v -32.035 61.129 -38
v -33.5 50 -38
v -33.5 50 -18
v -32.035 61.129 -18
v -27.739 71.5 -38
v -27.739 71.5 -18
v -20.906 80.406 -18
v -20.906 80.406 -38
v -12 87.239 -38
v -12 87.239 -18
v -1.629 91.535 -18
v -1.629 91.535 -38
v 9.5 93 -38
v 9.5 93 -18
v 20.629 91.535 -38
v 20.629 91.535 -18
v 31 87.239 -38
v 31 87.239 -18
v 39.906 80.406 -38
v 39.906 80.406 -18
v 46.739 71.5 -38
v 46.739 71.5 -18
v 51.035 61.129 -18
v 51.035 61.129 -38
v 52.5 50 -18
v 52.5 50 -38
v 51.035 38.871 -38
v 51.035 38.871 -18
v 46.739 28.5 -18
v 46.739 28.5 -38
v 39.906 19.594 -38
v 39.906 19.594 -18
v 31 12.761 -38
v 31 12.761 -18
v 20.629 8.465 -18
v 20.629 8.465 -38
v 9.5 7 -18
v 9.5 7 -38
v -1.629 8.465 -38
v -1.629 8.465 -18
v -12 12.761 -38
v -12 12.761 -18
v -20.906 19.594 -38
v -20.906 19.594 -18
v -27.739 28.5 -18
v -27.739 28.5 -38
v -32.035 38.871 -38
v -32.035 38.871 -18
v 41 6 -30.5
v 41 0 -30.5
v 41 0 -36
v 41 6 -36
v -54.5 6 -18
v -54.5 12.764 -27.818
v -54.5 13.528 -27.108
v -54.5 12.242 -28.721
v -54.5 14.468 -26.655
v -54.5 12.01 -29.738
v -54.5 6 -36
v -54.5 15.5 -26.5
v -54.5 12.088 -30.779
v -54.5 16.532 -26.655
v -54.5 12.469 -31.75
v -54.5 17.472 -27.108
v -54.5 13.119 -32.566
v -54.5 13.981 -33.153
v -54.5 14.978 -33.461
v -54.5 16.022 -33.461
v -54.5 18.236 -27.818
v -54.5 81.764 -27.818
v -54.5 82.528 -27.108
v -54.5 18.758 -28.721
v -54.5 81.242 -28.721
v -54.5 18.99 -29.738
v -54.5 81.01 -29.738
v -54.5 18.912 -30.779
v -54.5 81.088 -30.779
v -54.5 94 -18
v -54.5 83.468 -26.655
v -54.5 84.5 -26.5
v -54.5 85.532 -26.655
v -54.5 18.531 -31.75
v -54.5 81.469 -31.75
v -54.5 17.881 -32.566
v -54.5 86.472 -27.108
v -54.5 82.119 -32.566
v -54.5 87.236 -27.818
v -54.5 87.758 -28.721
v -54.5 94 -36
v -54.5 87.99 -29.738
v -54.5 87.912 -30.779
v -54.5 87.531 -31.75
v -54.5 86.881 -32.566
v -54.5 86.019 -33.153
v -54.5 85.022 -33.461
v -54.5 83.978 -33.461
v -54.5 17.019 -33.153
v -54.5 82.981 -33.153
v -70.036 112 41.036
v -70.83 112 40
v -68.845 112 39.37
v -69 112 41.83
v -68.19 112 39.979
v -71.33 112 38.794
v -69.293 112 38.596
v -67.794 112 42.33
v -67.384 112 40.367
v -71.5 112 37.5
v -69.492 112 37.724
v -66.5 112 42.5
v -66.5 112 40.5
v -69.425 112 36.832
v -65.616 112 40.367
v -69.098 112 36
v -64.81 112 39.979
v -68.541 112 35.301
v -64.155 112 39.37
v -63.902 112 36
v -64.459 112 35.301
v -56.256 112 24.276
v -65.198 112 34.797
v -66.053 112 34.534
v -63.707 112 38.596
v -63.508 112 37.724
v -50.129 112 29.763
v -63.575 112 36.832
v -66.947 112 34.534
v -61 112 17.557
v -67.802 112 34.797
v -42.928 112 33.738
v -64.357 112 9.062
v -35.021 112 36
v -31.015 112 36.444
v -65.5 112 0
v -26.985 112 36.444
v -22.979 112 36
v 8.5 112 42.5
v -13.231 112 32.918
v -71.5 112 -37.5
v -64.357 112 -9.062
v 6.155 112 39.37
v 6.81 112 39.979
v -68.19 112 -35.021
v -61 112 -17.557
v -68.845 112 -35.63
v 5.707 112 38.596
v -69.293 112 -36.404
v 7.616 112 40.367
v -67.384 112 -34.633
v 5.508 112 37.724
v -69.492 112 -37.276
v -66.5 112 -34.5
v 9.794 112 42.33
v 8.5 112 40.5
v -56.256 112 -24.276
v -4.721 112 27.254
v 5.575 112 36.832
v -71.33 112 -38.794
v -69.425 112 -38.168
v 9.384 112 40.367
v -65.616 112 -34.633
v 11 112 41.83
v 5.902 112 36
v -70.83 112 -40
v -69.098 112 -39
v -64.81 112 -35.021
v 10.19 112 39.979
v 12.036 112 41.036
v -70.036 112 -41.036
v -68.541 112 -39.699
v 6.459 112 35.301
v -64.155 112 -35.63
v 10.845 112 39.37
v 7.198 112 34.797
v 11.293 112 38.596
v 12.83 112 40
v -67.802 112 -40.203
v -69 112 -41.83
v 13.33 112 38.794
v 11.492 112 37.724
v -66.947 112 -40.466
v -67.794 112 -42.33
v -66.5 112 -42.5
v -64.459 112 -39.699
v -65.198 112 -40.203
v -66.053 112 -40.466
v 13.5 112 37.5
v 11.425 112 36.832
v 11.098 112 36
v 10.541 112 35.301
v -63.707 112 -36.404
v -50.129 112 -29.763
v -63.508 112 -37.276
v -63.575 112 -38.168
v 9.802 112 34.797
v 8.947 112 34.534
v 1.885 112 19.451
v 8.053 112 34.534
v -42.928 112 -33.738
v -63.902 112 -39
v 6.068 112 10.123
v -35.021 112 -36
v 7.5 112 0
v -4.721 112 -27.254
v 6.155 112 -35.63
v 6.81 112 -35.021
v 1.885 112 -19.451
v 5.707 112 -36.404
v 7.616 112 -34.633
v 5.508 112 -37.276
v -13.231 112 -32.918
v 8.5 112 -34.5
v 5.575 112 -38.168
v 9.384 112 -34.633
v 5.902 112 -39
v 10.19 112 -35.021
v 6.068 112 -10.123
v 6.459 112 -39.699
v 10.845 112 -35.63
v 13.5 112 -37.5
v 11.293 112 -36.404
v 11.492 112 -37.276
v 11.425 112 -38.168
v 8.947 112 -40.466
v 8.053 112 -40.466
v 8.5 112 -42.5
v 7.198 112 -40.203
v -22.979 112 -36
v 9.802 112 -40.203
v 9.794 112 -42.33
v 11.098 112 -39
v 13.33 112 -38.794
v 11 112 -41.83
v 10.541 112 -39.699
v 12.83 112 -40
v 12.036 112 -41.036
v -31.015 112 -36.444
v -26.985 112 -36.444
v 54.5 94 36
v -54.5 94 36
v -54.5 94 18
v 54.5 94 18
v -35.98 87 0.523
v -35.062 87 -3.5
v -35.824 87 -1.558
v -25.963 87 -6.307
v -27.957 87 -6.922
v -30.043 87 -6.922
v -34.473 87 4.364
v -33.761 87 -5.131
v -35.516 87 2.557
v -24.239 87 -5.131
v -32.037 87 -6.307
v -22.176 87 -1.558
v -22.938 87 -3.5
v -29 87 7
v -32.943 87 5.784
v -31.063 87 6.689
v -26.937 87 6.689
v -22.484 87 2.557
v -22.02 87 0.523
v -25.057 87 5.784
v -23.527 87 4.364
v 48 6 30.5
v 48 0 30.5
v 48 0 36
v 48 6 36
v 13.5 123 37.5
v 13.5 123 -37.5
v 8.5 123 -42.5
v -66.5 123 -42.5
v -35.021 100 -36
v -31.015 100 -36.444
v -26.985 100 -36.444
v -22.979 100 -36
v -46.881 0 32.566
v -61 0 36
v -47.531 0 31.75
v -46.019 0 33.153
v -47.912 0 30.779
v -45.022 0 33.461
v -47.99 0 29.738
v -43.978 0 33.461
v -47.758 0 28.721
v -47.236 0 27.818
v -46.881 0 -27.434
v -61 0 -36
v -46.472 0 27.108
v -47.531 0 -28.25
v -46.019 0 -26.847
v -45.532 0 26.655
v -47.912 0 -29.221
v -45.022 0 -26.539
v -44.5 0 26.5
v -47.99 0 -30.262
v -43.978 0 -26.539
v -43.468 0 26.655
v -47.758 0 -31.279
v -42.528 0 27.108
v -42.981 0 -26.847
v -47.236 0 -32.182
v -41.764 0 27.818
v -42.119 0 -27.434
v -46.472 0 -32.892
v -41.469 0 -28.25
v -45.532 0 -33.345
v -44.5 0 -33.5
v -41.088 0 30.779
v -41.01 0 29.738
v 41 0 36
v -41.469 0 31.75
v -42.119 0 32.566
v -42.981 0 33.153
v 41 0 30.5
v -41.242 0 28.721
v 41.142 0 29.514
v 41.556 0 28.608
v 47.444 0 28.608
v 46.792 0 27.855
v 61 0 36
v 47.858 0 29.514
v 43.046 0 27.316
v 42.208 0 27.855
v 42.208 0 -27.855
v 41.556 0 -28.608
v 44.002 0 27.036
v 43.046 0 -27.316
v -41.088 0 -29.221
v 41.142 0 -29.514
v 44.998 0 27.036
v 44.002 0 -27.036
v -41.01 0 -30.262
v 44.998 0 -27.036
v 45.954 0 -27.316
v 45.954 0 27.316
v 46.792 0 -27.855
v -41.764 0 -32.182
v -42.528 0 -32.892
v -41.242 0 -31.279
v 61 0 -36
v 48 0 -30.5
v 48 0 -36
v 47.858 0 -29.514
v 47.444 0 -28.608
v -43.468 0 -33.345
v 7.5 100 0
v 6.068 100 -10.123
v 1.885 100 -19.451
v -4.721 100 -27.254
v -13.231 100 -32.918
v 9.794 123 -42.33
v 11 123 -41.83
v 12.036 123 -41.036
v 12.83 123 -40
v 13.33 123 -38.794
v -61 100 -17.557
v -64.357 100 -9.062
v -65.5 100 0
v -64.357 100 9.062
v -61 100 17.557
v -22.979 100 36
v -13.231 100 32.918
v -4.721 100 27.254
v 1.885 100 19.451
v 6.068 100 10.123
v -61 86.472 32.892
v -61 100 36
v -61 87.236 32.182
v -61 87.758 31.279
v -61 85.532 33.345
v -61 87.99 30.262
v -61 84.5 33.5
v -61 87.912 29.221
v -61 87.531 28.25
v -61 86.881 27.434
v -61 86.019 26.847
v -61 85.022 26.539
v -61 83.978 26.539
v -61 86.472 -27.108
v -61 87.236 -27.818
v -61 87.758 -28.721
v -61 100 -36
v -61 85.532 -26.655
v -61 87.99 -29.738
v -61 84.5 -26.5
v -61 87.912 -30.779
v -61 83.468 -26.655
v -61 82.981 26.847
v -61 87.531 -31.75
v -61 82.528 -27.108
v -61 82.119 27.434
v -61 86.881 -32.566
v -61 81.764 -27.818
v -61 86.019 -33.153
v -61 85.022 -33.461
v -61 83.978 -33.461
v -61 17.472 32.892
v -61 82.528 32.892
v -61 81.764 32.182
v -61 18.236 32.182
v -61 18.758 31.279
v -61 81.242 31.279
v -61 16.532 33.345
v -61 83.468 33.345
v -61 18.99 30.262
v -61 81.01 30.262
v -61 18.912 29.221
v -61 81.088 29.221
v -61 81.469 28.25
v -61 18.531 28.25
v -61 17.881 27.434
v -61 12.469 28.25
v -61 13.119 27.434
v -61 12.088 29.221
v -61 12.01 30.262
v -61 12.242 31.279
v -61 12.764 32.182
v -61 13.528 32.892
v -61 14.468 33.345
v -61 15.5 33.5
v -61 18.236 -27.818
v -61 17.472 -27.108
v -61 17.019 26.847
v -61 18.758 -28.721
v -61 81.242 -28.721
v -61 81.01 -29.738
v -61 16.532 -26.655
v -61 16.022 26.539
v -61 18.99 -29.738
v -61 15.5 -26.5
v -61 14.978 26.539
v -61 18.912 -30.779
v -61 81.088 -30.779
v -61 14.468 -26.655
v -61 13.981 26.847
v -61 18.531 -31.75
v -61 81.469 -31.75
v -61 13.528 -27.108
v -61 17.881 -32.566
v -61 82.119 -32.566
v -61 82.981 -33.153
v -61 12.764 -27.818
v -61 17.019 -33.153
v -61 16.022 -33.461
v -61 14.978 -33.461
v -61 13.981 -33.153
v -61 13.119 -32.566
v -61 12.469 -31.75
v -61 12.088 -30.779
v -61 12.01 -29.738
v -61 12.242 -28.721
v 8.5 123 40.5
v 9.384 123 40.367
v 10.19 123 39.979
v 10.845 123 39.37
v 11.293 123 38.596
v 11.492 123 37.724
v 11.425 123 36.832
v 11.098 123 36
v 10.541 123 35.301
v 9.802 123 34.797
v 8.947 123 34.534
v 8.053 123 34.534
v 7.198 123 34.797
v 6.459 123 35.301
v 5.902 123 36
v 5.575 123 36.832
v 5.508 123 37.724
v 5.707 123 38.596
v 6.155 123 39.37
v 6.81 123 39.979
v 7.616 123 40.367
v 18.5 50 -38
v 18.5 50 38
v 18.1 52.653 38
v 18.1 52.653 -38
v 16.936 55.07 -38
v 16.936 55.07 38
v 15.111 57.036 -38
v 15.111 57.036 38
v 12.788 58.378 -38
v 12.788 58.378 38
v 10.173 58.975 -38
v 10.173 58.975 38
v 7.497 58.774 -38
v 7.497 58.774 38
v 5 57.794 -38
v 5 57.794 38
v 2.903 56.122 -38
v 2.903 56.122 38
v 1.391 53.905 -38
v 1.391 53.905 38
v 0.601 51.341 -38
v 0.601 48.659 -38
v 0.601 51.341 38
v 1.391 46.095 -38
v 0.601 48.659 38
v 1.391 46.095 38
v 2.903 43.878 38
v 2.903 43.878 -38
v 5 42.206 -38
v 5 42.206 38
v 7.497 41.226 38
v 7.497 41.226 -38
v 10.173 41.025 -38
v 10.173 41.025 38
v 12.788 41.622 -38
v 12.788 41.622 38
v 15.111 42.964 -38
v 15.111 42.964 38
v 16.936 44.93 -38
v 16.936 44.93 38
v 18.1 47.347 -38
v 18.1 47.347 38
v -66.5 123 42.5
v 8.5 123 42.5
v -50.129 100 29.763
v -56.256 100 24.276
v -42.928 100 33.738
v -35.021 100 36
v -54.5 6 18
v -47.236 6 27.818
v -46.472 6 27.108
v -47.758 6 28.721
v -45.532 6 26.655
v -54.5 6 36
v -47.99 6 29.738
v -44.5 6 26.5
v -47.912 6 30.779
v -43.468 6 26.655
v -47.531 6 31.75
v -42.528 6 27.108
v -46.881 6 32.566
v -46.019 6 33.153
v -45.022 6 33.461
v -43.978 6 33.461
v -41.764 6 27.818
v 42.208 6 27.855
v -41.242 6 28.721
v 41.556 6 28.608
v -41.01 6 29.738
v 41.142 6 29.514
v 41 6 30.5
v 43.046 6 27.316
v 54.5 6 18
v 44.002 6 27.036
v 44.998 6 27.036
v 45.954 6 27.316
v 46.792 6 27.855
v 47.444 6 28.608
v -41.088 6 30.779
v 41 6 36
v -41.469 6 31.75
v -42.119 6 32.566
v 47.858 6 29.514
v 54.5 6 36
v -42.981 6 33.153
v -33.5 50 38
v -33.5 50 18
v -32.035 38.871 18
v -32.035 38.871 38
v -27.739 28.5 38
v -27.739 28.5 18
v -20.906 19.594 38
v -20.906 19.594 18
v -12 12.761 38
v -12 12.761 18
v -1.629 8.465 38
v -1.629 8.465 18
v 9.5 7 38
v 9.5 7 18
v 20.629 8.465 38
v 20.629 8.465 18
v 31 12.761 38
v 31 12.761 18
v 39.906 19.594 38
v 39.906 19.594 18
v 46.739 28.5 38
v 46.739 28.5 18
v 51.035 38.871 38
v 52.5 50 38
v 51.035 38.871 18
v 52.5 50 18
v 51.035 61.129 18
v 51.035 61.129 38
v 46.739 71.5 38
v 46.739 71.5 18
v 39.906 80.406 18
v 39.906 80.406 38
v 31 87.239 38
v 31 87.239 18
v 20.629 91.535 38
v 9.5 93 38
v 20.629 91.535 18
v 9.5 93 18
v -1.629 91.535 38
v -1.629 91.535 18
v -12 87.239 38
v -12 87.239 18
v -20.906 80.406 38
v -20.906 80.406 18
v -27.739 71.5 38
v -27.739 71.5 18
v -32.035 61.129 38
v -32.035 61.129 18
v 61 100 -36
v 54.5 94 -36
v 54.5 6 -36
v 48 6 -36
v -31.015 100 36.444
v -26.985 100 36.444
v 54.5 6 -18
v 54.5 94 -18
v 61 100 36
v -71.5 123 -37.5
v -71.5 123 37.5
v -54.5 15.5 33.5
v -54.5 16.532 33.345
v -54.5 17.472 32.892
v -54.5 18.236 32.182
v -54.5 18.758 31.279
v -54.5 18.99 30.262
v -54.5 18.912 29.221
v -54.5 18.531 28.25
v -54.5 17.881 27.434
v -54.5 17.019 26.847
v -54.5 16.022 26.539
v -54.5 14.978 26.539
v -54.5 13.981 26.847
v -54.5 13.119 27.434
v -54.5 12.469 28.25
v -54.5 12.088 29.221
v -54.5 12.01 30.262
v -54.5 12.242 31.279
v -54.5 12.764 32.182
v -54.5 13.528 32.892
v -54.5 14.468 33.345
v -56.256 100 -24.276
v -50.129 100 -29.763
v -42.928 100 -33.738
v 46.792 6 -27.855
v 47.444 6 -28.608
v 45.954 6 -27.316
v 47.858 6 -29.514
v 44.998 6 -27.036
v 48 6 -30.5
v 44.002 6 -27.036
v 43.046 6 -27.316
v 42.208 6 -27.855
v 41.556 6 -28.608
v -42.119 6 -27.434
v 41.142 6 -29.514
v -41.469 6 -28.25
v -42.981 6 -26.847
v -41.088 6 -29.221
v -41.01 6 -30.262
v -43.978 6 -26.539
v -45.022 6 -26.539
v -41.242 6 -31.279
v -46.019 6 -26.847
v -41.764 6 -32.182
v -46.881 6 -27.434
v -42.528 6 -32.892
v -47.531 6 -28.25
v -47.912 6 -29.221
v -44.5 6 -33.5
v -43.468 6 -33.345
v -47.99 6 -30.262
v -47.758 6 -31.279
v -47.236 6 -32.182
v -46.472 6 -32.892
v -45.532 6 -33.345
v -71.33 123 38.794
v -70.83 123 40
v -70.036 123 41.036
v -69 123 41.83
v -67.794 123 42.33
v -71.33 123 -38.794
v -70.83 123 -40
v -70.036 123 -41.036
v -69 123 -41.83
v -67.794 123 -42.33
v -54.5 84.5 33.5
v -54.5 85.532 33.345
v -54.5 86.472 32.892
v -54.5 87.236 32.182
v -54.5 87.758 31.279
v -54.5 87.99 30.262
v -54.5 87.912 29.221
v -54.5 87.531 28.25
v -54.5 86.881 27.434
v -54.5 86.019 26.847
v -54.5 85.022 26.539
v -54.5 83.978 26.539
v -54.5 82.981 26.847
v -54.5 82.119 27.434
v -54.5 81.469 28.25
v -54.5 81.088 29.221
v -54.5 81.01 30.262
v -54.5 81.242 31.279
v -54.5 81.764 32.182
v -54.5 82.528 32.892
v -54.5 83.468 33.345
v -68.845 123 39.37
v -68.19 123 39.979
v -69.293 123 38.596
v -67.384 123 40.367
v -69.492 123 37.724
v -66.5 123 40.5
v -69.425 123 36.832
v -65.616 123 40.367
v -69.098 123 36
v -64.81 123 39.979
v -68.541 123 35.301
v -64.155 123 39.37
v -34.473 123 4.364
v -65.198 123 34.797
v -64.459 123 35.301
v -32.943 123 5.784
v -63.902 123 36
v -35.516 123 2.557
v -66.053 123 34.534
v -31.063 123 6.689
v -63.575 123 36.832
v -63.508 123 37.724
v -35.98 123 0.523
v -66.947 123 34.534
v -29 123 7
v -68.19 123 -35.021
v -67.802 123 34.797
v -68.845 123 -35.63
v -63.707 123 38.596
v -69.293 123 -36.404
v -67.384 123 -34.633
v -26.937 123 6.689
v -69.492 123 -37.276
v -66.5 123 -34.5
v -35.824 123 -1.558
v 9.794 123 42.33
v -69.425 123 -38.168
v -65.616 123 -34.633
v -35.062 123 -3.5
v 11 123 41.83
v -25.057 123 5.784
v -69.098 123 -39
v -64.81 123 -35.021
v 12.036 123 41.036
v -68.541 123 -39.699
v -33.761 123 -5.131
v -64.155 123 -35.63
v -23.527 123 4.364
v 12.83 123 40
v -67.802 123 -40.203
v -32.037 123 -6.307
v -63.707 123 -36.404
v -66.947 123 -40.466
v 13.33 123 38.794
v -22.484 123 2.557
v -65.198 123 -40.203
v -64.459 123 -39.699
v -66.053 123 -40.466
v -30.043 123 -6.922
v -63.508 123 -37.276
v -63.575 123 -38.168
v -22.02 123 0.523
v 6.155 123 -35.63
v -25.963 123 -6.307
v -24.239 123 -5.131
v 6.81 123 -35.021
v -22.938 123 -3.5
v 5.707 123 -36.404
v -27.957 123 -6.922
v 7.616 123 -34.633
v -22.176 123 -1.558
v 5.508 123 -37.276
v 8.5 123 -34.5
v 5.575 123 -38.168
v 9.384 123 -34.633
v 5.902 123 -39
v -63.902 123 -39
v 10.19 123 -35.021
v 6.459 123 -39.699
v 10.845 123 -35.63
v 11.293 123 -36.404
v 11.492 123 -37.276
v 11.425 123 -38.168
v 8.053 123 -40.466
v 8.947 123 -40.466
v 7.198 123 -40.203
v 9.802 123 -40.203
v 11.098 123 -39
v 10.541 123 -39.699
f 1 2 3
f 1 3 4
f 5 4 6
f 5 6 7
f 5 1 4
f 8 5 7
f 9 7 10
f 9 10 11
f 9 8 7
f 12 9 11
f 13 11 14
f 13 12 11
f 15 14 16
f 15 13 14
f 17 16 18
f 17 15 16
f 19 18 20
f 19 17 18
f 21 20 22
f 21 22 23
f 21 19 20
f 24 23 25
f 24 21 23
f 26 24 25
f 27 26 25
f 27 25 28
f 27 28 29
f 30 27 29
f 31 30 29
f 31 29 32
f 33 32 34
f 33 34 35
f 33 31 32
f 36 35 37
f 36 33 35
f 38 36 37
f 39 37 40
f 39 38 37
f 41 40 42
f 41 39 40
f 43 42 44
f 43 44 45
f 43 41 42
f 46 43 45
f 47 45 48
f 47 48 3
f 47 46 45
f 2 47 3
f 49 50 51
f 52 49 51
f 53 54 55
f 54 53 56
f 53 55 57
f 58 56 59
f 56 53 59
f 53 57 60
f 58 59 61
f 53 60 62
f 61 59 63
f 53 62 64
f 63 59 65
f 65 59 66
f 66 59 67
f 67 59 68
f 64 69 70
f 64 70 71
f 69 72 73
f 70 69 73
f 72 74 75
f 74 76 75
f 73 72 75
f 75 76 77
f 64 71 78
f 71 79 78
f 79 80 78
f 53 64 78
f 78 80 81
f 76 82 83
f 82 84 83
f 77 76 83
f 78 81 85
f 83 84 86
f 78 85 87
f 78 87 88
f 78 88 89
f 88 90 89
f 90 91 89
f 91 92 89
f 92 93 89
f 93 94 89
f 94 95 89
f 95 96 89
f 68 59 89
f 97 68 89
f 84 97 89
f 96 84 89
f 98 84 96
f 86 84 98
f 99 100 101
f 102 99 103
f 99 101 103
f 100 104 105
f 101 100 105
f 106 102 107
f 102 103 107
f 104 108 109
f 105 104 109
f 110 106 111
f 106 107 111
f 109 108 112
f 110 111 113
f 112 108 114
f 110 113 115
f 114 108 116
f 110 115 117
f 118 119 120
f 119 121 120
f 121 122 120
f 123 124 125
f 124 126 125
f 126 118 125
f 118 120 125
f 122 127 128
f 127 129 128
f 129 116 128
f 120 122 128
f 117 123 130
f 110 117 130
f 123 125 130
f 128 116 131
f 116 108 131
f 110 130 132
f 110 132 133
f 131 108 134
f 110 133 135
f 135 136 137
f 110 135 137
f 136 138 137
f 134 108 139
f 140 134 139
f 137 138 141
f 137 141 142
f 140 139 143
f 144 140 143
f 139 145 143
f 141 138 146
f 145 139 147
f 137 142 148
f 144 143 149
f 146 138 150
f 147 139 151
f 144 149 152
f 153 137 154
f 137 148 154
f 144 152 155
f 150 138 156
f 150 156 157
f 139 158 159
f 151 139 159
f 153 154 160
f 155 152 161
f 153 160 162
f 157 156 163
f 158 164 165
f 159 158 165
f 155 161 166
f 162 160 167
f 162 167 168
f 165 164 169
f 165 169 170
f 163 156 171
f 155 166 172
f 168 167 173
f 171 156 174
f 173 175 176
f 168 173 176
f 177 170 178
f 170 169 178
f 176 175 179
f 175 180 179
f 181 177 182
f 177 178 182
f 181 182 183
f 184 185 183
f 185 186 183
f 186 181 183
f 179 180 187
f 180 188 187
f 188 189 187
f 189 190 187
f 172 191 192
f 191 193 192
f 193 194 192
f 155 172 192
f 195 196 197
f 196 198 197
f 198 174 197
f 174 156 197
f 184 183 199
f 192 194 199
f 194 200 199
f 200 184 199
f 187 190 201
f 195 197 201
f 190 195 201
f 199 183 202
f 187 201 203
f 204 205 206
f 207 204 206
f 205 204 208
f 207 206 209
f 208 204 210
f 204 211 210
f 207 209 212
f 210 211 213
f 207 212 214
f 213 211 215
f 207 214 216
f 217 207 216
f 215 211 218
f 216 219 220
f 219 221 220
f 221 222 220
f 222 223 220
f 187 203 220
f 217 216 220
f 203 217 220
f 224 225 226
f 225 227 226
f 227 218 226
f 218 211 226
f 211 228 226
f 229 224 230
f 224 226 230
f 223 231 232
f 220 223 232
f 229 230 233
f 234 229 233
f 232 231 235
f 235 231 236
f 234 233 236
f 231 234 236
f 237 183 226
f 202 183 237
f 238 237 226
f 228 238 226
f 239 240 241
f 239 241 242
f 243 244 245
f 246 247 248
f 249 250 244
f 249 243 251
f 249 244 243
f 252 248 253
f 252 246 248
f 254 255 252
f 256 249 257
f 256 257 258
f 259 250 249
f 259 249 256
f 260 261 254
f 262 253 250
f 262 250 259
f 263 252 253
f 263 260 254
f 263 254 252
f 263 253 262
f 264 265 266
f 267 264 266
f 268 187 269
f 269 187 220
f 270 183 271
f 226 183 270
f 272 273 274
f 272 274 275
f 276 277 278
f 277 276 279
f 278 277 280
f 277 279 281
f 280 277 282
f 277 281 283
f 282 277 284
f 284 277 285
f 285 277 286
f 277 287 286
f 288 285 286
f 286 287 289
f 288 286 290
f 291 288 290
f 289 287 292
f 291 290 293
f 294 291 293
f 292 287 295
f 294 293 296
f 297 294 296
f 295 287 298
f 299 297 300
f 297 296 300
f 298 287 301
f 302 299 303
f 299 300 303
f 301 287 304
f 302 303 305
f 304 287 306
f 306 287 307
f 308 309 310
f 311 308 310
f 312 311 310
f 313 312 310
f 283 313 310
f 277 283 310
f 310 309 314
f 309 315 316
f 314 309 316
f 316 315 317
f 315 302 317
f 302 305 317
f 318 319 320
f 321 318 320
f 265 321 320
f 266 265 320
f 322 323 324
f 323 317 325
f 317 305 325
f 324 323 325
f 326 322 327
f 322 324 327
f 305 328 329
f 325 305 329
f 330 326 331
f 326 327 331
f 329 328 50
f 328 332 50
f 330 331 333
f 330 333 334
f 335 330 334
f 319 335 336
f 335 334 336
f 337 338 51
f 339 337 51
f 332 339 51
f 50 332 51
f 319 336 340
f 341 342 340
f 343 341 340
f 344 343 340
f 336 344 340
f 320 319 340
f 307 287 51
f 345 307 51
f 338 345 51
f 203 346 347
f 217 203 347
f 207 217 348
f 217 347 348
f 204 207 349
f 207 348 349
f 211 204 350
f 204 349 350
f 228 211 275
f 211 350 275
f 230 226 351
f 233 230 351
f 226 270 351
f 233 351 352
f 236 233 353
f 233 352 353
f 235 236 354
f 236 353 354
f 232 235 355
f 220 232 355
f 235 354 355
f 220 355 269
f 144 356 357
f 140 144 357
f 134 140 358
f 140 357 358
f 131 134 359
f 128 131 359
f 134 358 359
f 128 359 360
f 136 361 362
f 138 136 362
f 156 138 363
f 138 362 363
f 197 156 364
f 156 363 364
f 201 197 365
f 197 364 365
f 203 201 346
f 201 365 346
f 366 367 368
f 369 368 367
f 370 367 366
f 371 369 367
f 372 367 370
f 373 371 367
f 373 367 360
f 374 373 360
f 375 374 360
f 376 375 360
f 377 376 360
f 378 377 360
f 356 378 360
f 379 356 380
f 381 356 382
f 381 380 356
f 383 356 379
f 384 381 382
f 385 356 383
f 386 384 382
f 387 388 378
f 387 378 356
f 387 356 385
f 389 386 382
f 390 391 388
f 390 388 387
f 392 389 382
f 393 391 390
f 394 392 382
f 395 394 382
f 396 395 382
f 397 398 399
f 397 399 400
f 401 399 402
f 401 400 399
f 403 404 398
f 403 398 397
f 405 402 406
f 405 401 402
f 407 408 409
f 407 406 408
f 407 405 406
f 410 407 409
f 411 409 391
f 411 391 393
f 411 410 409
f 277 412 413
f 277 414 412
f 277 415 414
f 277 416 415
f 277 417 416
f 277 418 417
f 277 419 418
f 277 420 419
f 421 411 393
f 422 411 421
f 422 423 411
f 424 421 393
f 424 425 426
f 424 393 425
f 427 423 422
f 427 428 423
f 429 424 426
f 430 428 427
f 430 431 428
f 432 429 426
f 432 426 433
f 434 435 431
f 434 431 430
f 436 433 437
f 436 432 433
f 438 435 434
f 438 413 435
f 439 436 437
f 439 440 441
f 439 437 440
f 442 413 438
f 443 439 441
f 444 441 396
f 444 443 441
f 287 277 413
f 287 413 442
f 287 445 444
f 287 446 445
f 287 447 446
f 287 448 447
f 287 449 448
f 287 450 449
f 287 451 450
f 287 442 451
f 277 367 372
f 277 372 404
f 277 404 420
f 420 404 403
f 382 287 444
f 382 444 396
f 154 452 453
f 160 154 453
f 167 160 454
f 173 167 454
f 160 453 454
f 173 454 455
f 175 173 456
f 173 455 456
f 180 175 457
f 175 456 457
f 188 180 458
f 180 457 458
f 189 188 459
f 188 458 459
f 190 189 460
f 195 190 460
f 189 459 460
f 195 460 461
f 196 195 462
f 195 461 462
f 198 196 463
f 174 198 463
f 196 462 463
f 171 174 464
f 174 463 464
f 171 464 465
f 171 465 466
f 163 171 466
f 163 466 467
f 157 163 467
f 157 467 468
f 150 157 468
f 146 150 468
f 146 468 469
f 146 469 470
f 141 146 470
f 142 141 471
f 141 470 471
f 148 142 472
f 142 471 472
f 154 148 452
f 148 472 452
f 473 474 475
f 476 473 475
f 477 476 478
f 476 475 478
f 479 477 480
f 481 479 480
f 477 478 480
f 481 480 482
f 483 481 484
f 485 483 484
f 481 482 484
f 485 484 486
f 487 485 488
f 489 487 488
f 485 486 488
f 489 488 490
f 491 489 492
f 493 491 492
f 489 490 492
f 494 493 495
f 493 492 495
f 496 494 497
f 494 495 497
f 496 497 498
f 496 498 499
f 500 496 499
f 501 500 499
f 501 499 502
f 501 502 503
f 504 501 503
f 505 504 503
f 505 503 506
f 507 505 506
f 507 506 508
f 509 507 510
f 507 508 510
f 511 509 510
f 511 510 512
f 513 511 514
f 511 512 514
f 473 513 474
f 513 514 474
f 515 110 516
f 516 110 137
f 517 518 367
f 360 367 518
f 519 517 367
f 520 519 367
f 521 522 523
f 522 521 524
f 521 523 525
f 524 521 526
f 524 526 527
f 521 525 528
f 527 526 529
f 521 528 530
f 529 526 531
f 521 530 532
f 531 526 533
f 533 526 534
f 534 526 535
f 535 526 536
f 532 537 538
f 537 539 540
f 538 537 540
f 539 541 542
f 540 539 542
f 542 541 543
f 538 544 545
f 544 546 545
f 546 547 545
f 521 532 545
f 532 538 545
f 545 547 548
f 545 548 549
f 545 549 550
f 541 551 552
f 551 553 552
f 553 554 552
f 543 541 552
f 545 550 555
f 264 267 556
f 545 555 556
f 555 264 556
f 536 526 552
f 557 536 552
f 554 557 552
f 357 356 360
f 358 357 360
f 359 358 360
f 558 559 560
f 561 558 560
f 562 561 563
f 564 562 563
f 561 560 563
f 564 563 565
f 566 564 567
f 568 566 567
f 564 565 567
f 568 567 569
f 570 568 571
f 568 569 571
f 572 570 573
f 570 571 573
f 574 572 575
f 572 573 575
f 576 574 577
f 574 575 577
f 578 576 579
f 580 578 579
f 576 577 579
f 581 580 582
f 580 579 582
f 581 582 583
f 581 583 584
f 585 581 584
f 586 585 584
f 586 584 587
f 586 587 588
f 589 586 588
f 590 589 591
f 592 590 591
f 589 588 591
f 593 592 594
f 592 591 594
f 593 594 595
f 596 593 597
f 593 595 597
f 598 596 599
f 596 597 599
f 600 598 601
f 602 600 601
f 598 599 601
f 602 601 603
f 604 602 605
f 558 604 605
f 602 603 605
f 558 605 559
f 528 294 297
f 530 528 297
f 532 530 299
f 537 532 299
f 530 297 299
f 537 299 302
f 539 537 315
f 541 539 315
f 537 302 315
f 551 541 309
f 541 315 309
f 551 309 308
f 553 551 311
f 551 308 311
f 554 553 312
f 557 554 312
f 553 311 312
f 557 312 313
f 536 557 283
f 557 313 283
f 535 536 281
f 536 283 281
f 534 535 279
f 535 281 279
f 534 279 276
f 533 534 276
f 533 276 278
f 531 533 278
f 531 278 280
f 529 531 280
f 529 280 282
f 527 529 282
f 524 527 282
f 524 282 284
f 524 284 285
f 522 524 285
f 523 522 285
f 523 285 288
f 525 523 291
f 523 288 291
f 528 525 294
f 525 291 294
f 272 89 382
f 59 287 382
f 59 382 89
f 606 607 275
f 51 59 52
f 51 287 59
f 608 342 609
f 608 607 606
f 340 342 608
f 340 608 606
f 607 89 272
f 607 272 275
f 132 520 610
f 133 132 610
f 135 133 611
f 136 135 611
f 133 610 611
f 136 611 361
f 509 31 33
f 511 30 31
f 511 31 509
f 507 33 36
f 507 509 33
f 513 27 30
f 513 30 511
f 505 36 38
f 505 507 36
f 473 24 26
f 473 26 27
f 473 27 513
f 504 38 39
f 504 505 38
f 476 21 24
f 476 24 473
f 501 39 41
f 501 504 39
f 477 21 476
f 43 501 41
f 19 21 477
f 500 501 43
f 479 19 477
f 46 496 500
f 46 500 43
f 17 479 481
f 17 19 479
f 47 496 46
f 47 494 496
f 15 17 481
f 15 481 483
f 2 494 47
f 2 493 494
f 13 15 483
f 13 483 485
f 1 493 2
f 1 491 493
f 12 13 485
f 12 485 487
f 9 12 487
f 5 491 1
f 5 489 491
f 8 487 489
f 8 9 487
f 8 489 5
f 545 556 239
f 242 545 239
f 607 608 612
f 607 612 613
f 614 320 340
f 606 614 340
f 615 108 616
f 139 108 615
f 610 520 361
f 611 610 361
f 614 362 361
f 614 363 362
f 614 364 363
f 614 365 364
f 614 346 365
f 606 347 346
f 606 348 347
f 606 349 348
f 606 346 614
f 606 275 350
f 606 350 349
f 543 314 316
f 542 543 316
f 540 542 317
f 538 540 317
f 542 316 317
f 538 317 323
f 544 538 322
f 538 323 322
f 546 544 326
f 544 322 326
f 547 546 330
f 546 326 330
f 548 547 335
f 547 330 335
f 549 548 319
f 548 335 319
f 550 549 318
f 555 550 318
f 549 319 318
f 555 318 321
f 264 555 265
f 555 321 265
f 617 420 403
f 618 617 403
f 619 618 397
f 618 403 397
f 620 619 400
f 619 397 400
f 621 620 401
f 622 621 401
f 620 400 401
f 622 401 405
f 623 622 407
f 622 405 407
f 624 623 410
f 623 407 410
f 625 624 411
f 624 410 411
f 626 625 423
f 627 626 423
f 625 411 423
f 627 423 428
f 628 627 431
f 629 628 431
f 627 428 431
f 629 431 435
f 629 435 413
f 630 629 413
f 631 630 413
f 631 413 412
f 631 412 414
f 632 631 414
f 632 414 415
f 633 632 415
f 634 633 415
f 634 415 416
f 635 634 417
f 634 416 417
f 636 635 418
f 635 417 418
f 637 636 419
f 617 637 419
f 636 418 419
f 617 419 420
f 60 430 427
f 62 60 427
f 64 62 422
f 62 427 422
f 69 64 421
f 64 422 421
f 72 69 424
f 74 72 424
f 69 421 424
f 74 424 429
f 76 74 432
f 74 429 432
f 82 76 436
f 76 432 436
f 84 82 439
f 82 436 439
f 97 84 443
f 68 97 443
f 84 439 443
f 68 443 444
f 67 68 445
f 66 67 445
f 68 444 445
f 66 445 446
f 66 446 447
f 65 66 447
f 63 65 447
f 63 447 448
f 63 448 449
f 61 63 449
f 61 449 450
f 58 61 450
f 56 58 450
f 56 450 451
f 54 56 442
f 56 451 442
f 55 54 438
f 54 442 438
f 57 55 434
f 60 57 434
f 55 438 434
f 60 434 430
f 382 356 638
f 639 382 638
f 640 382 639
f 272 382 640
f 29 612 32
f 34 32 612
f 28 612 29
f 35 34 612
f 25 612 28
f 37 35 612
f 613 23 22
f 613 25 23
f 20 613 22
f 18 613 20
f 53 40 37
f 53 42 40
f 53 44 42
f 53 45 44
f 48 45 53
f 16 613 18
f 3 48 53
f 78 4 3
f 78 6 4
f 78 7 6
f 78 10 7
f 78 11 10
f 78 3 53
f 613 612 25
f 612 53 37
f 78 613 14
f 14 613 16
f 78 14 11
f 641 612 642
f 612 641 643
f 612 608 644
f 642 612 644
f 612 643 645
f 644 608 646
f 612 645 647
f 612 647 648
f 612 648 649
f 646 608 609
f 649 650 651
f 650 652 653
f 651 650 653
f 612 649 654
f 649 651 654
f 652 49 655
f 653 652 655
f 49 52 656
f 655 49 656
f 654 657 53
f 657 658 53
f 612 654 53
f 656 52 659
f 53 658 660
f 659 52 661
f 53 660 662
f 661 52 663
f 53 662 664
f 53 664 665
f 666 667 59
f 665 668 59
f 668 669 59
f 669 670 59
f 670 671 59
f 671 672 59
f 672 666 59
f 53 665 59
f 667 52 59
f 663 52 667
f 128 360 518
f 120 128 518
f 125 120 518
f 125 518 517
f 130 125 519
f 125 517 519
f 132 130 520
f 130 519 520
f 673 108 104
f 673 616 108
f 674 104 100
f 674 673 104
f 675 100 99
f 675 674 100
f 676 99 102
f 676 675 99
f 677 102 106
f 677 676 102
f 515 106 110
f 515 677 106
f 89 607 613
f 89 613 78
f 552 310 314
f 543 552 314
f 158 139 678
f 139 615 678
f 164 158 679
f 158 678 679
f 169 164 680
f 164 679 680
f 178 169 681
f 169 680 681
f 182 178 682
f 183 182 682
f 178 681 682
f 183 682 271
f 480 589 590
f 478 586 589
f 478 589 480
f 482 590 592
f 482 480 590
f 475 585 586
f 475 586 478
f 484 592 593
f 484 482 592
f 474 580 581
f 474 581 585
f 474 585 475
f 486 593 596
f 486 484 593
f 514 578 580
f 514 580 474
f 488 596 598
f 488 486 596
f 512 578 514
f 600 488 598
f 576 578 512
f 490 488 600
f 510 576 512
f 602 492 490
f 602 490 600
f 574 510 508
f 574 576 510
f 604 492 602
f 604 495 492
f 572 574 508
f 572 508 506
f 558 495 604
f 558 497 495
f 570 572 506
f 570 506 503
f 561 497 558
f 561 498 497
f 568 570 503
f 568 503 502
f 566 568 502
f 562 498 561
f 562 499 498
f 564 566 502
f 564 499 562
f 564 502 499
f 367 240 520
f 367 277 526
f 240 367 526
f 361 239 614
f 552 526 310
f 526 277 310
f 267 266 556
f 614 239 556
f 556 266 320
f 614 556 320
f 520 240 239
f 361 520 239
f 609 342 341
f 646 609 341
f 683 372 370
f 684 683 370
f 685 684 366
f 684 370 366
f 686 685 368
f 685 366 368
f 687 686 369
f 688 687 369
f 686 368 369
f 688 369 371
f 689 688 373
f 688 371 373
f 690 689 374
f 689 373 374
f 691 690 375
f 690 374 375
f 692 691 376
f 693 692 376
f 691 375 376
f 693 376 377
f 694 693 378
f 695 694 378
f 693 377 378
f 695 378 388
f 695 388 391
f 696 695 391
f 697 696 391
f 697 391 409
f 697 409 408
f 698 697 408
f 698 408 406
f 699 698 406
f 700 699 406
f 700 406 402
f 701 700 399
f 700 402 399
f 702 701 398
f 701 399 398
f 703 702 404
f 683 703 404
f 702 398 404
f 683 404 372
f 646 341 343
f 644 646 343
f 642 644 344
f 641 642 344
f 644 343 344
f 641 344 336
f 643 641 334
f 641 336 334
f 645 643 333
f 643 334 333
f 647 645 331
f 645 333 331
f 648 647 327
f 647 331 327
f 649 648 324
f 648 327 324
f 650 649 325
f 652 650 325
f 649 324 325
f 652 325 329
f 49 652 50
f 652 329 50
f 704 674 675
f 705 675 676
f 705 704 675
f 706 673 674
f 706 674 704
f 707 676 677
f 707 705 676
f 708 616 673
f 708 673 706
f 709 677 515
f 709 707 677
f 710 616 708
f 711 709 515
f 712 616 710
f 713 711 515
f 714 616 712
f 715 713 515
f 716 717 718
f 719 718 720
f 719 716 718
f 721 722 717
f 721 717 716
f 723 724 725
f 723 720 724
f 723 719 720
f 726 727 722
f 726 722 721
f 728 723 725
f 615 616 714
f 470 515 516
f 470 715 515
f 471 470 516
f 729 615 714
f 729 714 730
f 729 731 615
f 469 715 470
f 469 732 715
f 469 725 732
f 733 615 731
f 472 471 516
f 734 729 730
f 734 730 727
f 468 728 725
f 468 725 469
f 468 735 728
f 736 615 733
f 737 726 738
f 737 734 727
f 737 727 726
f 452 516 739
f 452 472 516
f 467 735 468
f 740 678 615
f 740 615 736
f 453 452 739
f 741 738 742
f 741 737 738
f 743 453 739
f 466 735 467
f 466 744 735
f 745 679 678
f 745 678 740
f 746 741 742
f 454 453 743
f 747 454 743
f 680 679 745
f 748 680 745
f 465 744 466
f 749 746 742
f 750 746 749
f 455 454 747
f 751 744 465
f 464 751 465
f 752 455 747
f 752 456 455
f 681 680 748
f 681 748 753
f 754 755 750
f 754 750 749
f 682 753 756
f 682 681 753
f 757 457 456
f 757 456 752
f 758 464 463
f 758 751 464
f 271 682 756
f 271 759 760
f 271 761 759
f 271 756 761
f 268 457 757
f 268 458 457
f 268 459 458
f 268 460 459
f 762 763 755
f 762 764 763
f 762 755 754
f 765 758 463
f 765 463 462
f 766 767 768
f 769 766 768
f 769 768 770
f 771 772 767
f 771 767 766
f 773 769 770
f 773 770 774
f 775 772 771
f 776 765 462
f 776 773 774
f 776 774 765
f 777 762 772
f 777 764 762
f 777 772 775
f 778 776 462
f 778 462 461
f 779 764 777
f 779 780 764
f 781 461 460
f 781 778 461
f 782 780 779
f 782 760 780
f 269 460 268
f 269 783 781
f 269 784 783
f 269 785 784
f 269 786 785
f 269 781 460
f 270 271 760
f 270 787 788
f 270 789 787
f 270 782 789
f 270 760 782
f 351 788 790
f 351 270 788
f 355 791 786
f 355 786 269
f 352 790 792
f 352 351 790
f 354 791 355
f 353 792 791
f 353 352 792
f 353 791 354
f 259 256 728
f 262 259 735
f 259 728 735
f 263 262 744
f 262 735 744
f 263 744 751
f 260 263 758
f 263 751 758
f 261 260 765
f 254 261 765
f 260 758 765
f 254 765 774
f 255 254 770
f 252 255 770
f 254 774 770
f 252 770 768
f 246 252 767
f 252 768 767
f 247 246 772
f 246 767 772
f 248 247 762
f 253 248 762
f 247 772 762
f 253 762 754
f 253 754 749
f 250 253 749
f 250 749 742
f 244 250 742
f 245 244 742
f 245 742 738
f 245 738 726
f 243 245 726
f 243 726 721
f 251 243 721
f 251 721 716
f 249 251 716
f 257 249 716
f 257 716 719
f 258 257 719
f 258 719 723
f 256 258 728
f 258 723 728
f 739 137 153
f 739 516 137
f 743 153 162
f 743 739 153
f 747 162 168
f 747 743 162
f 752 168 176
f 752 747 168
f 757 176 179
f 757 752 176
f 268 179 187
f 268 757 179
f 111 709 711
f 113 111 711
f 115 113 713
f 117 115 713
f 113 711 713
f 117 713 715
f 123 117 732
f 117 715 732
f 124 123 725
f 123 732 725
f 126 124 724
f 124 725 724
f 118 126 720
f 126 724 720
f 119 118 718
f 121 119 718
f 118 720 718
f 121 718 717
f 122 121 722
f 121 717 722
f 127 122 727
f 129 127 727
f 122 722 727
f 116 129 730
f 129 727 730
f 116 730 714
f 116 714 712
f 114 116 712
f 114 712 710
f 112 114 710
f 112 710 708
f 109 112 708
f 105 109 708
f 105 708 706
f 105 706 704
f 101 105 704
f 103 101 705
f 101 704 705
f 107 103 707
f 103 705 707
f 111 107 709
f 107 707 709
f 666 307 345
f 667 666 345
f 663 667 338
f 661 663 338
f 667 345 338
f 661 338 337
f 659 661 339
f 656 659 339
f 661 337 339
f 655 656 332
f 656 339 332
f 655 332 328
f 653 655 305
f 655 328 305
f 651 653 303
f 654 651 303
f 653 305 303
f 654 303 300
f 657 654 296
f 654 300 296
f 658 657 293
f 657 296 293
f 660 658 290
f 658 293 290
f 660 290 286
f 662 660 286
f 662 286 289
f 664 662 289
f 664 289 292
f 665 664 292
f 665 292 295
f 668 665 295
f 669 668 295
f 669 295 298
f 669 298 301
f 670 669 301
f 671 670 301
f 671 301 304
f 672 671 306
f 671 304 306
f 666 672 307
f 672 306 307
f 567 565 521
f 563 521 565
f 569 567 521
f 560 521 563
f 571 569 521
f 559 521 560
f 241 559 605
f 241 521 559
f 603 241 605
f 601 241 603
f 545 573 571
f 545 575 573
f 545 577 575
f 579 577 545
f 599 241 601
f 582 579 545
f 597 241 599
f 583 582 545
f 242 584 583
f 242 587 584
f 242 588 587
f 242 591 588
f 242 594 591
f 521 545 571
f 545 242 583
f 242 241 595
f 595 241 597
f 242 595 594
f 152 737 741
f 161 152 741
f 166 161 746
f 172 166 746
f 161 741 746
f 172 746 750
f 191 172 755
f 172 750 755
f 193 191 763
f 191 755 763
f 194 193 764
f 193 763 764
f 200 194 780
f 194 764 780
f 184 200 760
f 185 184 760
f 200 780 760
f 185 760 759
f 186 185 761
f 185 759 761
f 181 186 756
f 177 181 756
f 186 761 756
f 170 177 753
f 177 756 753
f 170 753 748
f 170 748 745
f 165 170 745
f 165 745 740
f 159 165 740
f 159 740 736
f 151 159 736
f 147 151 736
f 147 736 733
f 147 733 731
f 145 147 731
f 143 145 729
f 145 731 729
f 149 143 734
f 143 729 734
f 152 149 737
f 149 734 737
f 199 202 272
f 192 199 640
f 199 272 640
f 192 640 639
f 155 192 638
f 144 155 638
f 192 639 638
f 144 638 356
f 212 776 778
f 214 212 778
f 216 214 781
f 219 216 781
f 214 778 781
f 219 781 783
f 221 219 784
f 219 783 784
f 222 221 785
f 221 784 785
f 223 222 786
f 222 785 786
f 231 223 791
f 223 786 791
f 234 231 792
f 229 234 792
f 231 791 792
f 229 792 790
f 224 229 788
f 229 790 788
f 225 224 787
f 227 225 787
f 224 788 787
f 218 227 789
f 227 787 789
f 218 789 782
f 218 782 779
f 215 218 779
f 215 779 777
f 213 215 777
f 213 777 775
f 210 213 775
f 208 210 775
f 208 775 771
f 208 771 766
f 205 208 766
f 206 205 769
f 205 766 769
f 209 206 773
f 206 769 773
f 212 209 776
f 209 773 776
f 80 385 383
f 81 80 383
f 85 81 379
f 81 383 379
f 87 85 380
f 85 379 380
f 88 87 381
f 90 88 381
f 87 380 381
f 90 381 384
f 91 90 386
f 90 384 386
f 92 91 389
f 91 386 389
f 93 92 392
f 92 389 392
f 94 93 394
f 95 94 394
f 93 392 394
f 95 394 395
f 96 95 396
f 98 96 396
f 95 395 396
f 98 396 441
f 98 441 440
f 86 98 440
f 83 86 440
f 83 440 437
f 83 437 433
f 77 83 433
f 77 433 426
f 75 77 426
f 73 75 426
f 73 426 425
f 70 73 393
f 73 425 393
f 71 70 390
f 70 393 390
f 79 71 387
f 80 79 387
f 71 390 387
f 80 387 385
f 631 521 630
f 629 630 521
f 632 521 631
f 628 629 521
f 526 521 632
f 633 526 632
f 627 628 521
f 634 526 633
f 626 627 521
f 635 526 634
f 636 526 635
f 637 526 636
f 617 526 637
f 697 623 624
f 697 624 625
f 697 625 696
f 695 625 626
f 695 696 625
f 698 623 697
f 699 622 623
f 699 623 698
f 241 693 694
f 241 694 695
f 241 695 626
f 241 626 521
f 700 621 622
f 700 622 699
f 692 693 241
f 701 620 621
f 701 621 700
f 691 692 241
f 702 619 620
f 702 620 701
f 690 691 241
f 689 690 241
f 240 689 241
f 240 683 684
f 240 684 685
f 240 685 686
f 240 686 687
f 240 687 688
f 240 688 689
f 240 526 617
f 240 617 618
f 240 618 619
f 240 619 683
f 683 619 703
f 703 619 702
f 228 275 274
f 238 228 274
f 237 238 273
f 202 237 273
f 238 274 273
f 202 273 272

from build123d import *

# Parameters (mm, degrees)
CROQUIS2_W              = 122
CROQUIS2_H              = 72
SALIENTE_EXTRUIR1_DEPTH = 100
CROQUIS3_W              = 109
CROQUIS3_H              = 88
CORTAR_EXTRUIR1_DEPTH   = 18
CROQUIS4_W              = 109
CROQUIS4_H              = 88
CORTAR_EXTRUIR2_DEPTH   = 18
SALIENTE_EXTRUIR2_DEPTH = 12
CROQUIS6_W              = 85
CROQUIS6_H              = 85
SALIENTE_EXTRUIR3_DEPTH = 11
CROQUIS7_R              = 43
SALIENTE_EXTRUIR7_DEPTH = 20
SALIENTE_EXTRUIR8_START = 20
CROQUIS8_R              = 43
SALIENTE_EXTRUIR8_DEPTH = 20
CROQUIS9_R              = 9
CORTAR_EXTRUIR3_DEPTH   = 76
CROQUIS10_R             = 3.5
CORTAR_EXTRUIR5_DEPTH   = 6
CROQUIS11_R             = 3.5
CORTAR_EXTRUIR6_DEPTH   = 6.5
CROQUIS12_R             = 7
CORTAR_EXTRUIR7_DEPTH   = 36
CROQUIS13_R             = 3
CORTAR_EXTRUIR8_DEPTH   = 11
REDONDEO2_R             = 5


with BuildPart() as part:
    # Croquis2 → Saliente-Extruir1 (new body)
    with BuildSketch(Plane(origin=(0, 0, 0), x_dir=(1, 0, 0), z_dir=(0, 1, 0))):
        Rectangle(CROQUIS2_W, CROQUIS2_H)
    extrude(amount=SALIENTE_EXTRUIR1_DEPTH)

    # Croquis3 → Cortar-Extruir1 (cut)
    with BuildSketch(Plane(origin=(0, 0, -36), x_dir=(-1, 0, 0), z_dir=(0, 0, -1))):
        with Locations((0, 50)):
            Rectangle(CROQUIS3_W, CROQUIS3_H)
    extrude(amount=-CORTAR_EXTRUIR1_DEPTH, mode=Mode.SUBTRACT)

    # Croquis4 → Cortar-Extruir2 (cut)
    with BuildSketch(Plane.XY.offset(36)):
        with Locations((0, 50)):
            Rectangle(CROQUIS4_W, CROQUIS4_H)
    extrude(amount=-CORTAR_EXTRUIR2_DEPTH, mode=Mode.SUBTRACT)

    # Croquis5 → Saliente-Extruir2 (add)
    with BuildSketch(Plane(origin=(0, 100, 0), x_dir=(1, 0, 0), z_dir=(0, 1, 0))):
        with BuildLine():
            Line((-61, 17.557049866), (-61, 0))
            Line((-61, 0), (-29, 0))
            Line((-29, 0), (7.5, 0))
            ThreePointArc((7.5, 0), (-1.143141768, 23.584856359), (-22.979202711, 36))
            Line((-22.979202711, 36), (-35.020797289, 36))
            ThreePointArc((-35.020797289, 36), (-50.128910503, 29.762713938), (-61, 17.557049866))
        make_face()
        with BuildLine():
            Line((-61, -17.557049866), (-61, 0))
            Line((-61, 0), (-61, 17.557049866))
            ThreePointArc((-61, 17.557049866), (-65.5, 0), (-61, -17.557049866))
        make_face()
        with BuildLine():
            Line((-29, 0), (-61, 0))
            Line((-61, 0), (-61, -17.557049866))
            ThreePointArc((-61, -17.557049866), (-50.128910503, -29.762713938), (-35.020797289, -36))
            Line((-35.020797289, -36), (-22.979202711, -36))
            ThreePointArc((-22.979202711, -36), (-1.143141768, -23.584856359), (7.5, 0))
            Line((7.5, 0), (-29, 0))
        make_face()
        with BuildLine():
            Line((-22.979202711, -36), (-35.020797289, -36))
            ThreePointArc((-35.020797289, -36), (-29, -36.5), (-22.979202711, -36))
        make_face()
        with BuildLine():
            ThreePointArc((-22.979202711, 36), (-29, 36.5), (-35.020797289, 36))
            Line((-35.020797289, 36), (-22.979202711, 36))
        make_face()
    extrude(amount=SALIENTE_EXTRUIR2_DEPTH)

    # Croquis6 → Saliente-Extruir3 (add)
    with BuildSketch(Plane(origin=(0, 112, 0), x_dir=(1, 0, 0), z_dir=(0, 1, 0))):
        with Locations((-29, 0)):
            Rectangle(CROQUIS6_W, CROQUIS6_H)
    extrude(amount=SALIENTE_EXTRUIR3_DEPTH)

    # Croquis7 → Saliente-Extruir7 (add)
    with BuildSketch(Plane.XY.offset(18)):
        with Locations(Location((9.5, 50, 0), (0, 0, 180))):
            Circle(CROQUIS7_R)
    extrude(amount=SALIENTE_EXTRUIR7_DEPTH)

    # Croquis8 → Saliente-Extruir8 (add)
    with BuildSketch(Plane(origin=(0, 0, -18), x_dir=(-1, 0, 0), z_dir=(0, 0, -1)).offset(SALIENTE_EXTRUIR8_START)):
        with Locations((-9.5, 50)):
            Circle(CROQUIS8_R)
    extrude(amount=-SALIENTE_EXTRUIR8_DEPTH)

    # Croquis9 → Cortar-Extruir3 (cut)
    with BuildSketch(Plane.XY.offset(38)):
        with Locations((9.5, 50)):
            Circle(CROQUIS9_R)
    extrude(amount=-CORTAR_EXTRUIR3_DEPTH, mode=Mode.SUBTRACT)

    # Croquis10 → Cortar-Extruir5 (cut)
    with BuildSketch(Plane.XZ):
        with BuildLine():
            Line((48, 36), (41, 36))
            Line((41, 36), (41, 30.5))
            ThreePointArc((41, 30.5), (44.5, 27), (48, 30.5))
            Line((48, 30.5), (48, 36))
        make_face()
        with BuildLine():
            Line((41, -30.5), (41, -36))
            Line((41, -36), (48, -36))
            Line((48, -36), (48, -30.5))
            ThreePointArc((48, -30.5), (44.5, -27), (41, -30.5))
        make_face()
        with Locations(Location((-44.5, -30, 0), (0, 0, 270))):
            Circle(CROQUIS10_R)
        with Locations(Location((-44.5, 30, 0), (0, 0, 270))):
            Circle(CROQUIS10_R)
    extrude(amount=-CORTAR_EXTRUIR5_DEPTH, mode=Mode.SUBTRACT)

    # Croquis11 → Cortar-Extruir6 (cut)
    with BuildSketch(Plane.ZY.offset(61)):
        with Locations((-30, 84.5)):
            Circle(CROQUIS11_R)
        with Locations((30, 84.5)):
            Circle(CROQUIS11_R)
        with Locations((-30, 15.5)):
            Circle(CROQUIS11_R)
        with Locations((30, 15.5)):
            Circle(CROQUIS11_R)
    extrude(amount=-CORTAR_EXTRUIR6_DEPTH, mode=Mode.SUBTRACT)

    # Croquis12 → Cortar-Extruir7 (cut)
    with BuildSketch(Plane(origin=(0, 123, 0), x_dir=(1, 0, 0), z_dir=(0, 1, 0))):
        with Locations(Location((-29, 0, 0), (0, 0, 270))):
            Circle(CROQUIS12_R)
    extrude(amount=-CORTAR_EXTRUIR7_DEPTH, mode=Mode.SUBTRACT)

    # Croquis13 → Cortar-Extruir8 (cut)
    with BuildSketch(Plane(origin=(0, 123, 0), x_dir=(1, 0, 0), z_dir=(0, 1, 0))):
        with Locations(Location((-66.5, 37.5, 0), (0, 0, 270))):
            Circle(CROQUIS13_R)
        with Locations(Location((8.5, 37.5, 0), (0, 0, 270))):
            Circle(CROQUIS13_R)
        with Locations(Location((-66.5, -37.5, 0), (0, 0, 270))):
            Circle(CROQUIS13_R)
        with Locations(Location((8.5, -37.5, 0), (0, 0, 270))):
            Circle(CROQUIS13_R)
    extrude(amount=-CORTAR_EXTRUIR8_DEPTH, mode=Mode.SUBTRACT)

    # Redondeo2
    redondeo2_edges = [part.edges().sort_by_distance(p)[0] for p in [
        (13.5, 117.5, 42.5),
        (13.5, 117.5, -42.5),
        (-71.5, 117.5, -42.5),
        (-71.5, 117.5, 42.5),
    ]]
    fillet(redondeo2_edges, radius=REDONDEO2_R)


solid = part.part
